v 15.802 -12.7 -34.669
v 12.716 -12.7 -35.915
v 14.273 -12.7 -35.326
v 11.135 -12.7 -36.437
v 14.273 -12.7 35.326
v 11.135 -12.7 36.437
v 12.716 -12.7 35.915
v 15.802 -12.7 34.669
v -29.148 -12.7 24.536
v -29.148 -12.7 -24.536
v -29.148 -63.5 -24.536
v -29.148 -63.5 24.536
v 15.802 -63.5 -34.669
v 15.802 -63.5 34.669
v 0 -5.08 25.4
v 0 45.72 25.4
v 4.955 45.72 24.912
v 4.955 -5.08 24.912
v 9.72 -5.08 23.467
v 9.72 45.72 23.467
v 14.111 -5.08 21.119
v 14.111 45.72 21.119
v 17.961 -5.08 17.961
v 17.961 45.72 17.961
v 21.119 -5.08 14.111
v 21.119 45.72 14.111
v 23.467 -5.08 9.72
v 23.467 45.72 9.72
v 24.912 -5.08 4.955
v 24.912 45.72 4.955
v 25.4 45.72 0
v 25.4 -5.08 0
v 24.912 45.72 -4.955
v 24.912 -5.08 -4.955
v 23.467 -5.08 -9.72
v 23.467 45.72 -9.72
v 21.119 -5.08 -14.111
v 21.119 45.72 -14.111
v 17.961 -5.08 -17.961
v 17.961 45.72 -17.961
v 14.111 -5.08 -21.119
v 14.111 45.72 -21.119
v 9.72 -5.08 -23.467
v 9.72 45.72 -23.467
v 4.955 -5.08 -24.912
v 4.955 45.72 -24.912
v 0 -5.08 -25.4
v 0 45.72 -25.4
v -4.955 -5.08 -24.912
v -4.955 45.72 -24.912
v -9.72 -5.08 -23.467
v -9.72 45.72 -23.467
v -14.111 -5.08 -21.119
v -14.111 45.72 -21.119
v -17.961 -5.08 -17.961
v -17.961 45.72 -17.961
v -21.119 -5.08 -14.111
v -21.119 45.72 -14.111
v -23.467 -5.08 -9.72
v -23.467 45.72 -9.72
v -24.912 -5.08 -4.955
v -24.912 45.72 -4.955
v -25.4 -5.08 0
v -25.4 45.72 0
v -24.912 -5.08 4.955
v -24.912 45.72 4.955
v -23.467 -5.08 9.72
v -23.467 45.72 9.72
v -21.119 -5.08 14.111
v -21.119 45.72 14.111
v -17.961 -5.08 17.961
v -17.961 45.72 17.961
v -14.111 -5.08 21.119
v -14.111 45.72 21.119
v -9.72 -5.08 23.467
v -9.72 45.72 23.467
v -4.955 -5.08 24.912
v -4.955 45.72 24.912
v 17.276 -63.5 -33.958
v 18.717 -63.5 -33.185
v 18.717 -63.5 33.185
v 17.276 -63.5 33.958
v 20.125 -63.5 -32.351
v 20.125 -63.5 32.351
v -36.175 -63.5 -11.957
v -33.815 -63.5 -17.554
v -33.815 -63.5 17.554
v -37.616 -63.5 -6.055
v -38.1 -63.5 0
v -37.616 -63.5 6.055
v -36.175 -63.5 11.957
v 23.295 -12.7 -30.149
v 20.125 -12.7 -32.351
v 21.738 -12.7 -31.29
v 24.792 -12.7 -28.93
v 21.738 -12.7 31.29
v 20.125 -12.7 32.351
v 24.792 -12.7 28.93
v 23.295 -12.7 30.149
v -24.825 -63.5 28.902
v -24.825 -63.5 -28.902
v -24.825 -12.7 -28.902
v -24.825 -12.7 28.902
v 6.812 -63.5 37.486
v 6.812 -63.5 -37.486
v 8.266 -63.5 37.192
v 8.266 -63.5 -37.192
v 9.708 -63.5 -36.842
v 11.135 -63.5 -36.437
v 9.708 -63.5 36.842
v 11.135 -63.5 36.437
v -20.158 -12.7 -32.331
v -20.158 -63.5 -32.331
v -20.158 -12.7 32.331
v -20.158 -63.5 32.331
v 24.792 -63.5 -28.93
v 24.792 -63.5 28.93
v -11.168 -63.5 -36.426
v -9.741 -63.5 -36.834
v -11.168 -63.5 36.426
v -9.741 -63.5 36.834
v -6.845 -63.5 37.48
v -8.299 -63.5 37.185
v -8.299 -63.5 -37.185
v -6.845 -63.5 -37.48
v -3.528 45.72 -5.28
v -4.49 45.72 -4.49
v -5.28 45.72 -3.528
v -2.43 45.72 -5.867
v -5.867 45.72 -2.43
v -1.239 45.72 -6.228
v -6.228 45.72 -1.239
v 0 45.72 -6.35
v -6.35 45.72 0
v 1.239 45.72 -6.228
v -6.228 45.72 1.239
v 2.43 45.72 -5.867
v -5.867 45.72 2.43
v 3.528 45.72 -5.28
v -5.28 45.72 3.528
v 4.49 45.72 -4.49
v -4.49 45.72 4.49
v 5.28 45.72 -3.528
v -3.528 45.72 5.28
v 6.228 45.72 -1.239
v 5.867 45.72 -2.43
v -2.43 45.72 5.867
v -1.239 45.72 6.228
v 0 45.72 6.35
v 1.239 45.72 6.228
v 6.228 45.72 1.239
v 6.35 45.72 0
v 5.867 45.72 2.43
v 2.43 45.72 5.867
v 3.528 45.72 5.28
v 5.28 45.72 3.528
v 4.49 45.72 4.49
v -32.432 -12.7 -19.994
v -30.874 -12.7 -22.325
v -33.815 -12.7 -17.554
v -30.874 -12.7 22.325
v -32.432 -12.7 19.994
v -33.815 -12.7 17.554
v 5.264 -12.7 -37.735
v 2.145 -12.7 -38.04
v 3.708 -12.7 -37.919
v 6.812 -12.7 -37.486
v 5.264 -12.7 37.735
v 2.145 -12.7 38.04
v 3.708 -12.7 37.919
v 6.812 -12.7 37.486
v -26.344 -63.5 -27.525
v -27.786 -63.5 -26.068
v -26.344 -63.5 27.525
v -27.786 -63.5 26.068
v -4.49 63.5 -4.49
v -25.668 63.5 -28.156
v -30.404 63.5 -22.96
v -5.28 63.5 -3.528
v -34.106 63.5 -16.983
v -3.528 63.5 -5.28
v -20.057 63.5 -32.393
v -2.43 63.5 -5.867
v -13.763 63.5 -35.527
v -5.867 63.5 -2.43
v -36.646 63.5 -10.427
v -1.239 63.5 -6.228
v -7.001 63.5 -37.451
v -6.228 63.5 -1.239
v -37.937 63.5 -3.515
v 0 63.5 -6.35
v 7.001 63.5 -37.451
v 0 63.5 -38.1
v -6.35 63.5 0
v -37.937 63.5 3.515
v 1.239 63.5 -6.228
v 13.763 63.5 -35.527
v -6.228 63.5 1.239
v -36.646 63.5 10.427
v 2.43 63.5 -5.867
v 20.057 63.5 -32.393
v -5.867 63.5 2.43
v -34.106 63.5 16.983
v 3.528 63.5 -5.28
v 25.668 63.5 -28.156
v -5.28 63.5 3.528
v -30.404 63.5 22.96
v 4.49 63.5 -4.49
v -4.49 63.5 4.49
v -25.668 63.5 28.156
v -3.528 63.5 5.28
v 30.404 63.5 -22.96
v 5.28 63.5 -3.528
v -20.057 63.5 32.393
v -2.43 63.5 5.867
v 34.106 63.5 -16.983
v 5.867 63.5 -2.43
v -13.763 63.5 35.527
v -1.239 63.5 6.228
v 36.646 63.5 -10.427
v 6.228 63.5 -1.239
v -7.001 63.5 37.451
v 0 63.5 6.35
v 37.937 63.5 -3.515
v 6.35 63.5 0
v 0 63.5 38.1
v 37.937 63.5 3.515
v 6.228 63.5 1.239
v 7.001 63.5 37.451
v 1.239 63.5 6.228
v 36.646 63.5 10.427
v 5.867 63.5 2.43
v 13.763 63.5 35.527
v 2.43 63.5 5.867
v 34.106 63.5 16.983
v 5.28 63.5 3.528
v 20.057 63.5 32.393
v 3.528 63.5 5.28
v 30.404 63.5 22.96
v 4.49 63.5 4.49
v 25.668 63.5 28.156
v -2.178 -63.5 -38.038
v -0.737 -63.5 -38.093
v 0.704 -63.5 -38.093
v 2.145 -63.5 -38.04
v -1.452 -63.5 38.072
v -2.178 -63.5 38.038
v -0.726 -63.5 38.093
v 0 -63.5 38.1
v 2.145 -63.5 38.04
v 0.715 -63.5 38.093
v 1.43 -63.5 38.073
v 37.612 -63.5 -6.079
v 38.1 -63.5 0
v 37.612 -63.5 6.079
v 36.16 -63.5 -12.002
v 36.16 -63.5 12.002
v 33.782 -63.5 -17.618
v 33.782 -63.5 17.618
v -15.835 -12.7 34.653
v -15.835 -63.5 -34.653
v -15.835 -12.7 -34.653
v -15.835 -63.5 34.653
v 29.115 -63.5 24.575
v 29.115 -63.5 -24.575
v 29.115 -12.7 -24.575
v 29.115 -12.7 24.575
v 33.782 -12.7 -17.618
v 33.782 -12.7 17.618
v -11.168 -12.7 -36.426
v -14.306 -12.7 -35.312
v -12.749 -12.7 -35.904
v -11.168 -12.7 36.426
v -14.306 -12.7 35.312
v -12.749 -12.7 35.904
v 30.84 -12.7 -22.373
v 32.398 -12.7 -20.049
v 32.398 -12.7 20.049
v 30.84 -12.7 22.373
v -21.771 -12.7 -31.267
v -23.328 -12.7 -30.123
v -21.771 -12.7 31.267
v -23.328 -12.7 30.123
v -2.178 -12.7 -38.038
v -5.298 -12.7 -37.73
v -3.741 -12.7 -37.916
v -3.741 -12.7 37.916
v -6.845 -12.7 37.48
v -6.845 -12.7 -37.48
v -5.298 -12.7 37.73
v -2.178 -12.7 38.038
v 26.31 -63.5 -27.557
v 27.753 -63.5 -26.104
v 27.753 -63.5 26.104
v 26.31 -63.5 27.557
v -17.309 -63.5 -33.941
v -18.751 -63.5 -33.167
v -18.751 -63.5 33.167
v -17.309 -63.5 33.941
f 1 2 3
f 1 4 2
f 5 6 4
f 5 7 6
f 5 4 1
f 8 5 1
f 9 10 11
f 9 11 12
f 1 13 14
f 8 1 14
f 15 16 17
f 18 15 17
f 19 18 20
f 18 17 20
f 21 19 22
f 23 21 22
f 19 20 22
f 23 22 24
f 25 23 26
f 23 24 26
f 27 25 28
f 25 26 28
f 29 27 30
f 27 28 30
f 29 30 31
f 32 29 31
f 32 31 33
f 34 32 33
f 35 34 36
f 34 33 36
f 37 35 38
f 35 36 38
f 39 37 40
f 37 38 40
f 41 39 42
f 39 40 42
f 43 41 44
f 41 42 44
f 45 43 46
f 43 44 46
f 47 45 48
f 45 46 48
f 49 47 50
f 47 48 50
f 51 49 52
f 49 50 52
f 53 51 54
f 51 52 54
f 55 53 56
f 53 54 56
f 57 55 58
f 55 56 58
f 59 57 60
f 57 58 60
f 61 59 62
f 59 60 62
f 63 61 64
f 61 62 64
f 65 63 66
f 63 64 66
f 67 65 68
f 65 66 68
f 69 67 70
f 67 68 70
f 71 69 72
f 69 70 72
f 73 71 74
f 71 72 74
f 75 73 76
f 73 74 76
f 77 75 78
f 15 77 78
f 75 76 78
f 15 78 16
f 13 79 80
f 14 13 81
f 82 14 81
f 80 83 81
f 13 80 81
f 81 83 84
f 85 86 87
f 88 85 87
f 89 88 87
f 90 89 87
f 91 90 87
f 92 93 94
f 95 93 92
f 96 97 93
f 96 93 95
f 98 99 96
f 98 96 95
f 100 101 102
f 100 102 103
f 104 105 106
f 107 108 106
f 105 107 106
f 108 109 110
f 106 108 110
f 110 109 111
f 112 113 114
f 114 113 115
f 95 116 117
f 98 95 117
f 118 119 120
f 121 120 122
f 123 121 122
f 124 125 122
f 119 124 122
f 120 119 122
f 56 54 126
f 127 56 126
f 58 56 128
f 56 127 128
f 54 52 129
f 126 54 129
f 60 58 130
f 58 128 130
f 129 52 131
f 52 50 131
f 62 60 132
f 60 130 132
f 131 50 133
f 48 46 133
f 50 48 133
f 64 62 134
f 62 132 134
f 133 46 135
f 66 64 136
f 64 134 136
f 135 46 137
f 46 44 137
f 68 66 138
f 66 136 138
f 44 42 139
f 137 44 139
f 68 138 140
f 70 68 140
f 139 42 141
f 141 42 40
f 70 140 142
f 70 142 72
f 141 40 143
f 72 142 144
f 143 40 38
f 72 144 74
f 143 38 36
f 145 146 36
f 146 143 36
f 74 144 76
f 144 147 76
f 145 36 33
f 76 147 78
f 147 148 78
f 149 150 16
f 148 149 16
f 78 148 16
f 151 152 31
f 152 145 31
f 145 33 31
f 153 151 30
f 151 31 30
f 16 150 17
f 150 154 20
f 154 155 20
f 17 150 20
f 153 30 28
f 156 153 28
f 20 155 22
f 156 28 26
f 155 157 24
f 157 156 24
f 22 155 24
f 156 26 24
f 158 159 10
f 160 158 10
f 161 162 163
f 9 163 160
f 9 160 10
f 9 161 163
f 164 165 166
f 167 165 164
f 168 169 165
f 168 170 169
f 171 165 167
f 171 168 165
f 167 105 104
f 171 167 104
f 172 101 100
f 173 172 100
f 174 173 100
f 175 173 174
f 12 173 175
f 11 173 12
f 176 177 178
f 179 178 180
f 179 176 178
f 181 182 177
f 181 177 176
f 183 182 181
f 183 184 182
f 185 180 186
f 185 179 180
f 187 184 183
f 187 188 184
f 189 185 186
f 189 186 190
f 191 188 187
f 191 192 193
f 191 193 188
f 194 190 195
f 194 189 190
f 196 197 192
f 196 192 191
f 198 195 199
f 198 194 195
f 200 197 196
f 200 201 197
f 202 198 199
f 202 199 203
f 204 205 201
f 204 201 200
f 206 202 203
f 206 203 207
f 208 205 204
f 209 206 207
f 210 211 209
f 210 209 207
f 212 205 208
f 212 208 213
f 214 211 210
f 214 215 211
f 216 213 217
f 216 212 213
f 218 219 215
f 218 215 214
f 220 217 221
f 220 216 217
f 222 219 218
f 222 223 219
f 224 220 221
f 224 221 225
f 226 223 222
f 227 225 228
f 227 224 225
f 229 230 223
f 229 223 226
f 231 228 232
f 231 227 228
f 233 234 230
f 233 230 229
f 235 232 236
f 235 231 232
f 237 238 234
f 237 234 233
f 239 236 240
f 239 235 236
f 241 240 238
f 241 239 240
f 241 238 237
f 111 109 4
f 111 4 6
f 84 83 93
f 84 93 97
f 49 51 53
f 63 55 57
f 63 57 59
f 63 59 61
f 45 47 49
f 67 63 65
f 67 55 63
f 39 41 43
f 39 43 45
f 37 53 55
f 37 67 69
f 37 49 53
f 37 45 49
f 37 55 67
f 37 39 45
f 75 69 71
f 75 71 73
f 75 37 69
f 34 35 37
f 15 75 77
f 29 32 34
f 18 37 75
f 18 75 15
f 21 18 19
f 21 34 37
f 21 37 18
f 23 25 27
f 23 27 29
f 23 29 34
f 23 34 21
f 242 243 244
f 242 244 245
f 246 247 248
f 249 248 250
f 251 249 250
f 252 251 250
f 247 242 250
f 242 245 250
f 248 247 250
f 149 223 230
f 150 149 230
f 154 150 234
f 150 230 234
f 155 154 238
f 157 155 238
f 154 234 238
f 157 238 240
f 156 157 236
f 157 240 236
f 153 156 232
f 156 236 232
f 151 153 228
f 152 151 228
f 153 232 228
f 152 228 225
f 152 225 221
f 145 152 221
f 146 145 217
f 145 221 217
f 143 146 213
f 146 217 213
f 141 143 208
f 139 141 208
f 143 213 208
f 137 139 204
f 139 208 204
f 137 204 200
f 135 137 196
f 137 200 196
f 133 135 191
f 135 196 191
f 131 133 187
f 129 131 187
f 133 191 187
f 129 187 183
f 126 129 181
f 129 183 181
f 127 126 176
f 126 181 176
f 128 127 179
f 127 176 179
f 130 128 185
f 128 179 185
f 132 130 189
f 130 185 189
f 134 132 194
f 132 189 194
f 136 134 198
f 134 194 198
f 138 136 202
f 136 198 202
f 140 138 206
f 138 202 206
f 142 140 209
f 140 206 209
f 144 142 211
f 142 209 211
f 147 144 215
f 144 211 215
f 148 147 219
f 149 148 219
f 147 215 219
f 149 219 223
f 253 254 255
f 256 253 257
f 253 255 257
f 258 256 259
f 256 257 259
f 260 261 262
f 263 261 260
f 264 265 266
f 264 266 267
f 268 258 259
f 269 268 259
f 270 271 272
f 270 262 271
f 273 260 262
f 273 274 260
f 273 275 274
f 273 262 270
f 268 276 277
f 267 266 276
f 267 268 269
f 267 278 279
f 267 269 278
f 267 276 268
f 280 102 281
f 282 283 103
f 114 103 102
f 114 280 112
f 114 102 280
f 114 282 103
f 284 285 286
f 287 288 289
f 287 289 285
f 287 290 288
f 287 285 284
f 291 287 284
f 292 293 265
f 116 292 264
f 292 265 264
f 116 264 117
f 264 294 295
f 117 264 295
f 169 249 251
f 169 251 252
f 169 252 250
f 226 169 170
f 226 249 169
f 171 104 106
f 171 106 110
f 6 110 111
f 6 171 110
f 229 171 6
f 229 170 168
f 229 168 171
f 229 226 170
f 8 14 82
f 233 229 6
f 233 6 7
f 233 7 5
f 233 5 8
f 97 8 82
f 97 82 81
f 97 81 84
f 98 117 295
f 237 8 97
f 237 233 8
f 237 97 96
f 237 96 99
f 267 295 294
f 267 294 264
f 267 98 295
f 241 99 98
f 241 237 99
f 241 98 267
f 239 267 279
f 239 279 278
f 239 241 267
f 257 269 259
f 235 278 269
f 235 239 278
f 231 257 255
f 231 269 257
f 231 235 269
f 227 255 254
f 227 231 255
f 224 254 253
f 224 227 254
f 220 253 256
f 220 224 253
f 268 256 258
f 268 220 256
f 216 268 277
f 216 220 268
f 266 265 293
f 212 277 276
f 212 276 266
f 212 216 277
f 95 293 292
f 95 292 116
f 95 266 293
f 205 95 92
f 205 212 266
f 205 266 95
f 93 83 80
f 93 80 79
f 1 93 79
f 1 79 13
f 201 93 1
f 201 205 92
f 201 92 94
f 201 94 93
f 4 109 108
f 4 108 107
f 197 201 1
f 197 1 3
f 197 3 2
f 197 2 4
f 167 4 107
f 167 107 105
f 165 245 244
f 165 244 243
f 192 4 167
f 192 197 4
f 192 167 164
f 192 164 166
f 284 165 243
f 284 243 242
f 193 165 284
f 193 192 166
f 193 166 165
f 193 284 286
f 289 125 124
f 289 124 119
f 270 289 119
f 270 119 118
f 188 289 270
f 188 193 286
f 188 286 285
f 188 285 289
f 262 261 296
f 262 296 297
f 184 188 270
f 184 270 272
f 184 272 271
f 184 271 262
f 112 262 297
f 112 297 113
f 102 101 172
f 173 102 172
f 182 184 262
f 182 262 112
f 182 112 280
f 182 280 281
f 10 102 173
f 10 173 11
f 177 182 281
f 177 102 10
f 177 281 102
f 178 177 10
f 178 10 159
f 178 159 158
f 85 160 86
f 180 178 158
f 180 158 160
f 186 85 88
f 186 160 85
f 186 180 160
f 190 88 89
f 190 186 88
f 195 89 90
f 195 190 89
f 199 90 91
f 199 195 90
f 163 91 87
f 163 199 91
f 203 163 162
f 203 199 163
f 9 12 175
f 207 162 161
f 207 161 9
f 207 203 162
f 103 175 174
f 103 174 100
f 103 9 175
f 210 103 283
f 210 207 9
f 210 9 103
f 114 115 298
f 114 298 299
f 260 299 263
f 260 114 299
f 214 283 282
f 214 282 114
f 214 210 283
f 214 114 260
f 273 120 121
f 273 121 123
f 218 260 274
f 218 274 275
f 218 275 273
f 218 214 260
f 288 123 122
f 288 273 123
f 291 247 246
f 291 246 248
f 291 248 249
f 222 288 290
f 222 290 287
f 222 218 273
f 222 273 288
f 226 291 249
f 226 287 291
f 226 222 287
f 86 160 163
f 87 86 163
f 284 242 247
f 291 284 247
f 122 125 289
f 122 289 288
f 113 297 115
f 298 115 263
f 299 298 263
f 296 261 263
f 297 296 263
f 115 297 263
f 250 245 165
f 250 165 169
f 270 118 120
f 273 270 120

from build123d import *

# Parameters (mm, degrees)
ESQUISSE1_R             = 38.1
BOSS_EXTRU_1_DEPTH      = 63.5
ESQUISSE2_R             = 6.35
ENL_V_MAT_EXTRU_1_DEPTH = 17.78
ESQUISSE3_R             = 25.4
ENL_V_MAT_EXTRU_2_DEPTH = 50.8
ESQUISSE4_W             = 4.66725
ESQUISSE4_H             = 76.2
ENL_V_MAT_EXTRU_3_DEPTH = 50.8


with BuildPart() as part:
    # Esquisse1 → Boss.-Extru.1 (new, symmetric)
    with BuildSketch(Plane(origin=(0, 0, 0), x_dir=(1, 0, 0), z_dir=(0, 1, 0))):
        with Locations(Location((0, 0, 0), (0, 0, 270))):
            Circle(ESQUISSE1_R)
    extrude(amount=BOSS_EXTRU_1_DEPTH, both=True)

    # Esquisse2 → Enlèv. mat.-Extru.1 (cut)
    with BuildSketch(Plane(origin=(0, 63.5, 0), x_dir=(1, 0, 0), z_dir=(0, 1, 0))):
        with Locations(Location((0, 0, 0), (0, 0, 270))):
            Circle(ESQUISSE2_R)
    extrude(amount=-ENL_V_MAT_EXTRU_1_DEPTH, mode=Mode.SUBTRACT)

    # Esquisse3 → Enlèv. mat.-Extru.2 (cut)
    with BuildSketch(Plane(origin=(0, 45.72, 0), x_dir=(1, 0, 0), z_dir=(0, 1, 0))):
        with Locations(Location((0, 0, 0), (0, 0, 270))):
            Circle(ESQUISSE3_R)
    extrude(amount=-ENL_V_MAT_EXTRU_2_DEPTH, mode=Mode.SUBTRACT)

    # Esquisse4 → Enlèv. mat.-Extru.3 (cut)
    with BuildSketch(Plane.XZ.offset(63.5)):
        with Locations((22.458375, 0)):
            Rectangle(ESQUISSE4_W, ESQUISSE4_H)
        with Locations((31.448375, 0)):
            Rectangle(ESQUISSE4_W, ESQUISSE4_H)
        with Locations((13.468375, 0)):
            Rectangle(ESQUISSE4_W, ESQUISSE4_H)
        with Locations((4.478375, 0)):
            Rectangle(ESQUISSE4_W, ESQUISSE4_H)
        with Locations((-4.511625, 0)):
            Rectangle(ESQUISSE4_W, ESQUISSE4_H)
        with Locations((-13.501625, 0)):
            Rectangle(ESQUISSE4_W, ESQUISSE4_H)
        with Locations((-22.491625, 0)):
            Rectangle(ESQUISSE4_W, ESQUISSE4_H)
        with Locations((-31.481625, 0)):
            Rectangle(ESQUISSE4_W, ESQUISSE4_H)
    extrude(amount=-ENL_V_MAT_EXTRU_3_DEPTH, mode=Mode.SUBTRACT)


solid = part.part
